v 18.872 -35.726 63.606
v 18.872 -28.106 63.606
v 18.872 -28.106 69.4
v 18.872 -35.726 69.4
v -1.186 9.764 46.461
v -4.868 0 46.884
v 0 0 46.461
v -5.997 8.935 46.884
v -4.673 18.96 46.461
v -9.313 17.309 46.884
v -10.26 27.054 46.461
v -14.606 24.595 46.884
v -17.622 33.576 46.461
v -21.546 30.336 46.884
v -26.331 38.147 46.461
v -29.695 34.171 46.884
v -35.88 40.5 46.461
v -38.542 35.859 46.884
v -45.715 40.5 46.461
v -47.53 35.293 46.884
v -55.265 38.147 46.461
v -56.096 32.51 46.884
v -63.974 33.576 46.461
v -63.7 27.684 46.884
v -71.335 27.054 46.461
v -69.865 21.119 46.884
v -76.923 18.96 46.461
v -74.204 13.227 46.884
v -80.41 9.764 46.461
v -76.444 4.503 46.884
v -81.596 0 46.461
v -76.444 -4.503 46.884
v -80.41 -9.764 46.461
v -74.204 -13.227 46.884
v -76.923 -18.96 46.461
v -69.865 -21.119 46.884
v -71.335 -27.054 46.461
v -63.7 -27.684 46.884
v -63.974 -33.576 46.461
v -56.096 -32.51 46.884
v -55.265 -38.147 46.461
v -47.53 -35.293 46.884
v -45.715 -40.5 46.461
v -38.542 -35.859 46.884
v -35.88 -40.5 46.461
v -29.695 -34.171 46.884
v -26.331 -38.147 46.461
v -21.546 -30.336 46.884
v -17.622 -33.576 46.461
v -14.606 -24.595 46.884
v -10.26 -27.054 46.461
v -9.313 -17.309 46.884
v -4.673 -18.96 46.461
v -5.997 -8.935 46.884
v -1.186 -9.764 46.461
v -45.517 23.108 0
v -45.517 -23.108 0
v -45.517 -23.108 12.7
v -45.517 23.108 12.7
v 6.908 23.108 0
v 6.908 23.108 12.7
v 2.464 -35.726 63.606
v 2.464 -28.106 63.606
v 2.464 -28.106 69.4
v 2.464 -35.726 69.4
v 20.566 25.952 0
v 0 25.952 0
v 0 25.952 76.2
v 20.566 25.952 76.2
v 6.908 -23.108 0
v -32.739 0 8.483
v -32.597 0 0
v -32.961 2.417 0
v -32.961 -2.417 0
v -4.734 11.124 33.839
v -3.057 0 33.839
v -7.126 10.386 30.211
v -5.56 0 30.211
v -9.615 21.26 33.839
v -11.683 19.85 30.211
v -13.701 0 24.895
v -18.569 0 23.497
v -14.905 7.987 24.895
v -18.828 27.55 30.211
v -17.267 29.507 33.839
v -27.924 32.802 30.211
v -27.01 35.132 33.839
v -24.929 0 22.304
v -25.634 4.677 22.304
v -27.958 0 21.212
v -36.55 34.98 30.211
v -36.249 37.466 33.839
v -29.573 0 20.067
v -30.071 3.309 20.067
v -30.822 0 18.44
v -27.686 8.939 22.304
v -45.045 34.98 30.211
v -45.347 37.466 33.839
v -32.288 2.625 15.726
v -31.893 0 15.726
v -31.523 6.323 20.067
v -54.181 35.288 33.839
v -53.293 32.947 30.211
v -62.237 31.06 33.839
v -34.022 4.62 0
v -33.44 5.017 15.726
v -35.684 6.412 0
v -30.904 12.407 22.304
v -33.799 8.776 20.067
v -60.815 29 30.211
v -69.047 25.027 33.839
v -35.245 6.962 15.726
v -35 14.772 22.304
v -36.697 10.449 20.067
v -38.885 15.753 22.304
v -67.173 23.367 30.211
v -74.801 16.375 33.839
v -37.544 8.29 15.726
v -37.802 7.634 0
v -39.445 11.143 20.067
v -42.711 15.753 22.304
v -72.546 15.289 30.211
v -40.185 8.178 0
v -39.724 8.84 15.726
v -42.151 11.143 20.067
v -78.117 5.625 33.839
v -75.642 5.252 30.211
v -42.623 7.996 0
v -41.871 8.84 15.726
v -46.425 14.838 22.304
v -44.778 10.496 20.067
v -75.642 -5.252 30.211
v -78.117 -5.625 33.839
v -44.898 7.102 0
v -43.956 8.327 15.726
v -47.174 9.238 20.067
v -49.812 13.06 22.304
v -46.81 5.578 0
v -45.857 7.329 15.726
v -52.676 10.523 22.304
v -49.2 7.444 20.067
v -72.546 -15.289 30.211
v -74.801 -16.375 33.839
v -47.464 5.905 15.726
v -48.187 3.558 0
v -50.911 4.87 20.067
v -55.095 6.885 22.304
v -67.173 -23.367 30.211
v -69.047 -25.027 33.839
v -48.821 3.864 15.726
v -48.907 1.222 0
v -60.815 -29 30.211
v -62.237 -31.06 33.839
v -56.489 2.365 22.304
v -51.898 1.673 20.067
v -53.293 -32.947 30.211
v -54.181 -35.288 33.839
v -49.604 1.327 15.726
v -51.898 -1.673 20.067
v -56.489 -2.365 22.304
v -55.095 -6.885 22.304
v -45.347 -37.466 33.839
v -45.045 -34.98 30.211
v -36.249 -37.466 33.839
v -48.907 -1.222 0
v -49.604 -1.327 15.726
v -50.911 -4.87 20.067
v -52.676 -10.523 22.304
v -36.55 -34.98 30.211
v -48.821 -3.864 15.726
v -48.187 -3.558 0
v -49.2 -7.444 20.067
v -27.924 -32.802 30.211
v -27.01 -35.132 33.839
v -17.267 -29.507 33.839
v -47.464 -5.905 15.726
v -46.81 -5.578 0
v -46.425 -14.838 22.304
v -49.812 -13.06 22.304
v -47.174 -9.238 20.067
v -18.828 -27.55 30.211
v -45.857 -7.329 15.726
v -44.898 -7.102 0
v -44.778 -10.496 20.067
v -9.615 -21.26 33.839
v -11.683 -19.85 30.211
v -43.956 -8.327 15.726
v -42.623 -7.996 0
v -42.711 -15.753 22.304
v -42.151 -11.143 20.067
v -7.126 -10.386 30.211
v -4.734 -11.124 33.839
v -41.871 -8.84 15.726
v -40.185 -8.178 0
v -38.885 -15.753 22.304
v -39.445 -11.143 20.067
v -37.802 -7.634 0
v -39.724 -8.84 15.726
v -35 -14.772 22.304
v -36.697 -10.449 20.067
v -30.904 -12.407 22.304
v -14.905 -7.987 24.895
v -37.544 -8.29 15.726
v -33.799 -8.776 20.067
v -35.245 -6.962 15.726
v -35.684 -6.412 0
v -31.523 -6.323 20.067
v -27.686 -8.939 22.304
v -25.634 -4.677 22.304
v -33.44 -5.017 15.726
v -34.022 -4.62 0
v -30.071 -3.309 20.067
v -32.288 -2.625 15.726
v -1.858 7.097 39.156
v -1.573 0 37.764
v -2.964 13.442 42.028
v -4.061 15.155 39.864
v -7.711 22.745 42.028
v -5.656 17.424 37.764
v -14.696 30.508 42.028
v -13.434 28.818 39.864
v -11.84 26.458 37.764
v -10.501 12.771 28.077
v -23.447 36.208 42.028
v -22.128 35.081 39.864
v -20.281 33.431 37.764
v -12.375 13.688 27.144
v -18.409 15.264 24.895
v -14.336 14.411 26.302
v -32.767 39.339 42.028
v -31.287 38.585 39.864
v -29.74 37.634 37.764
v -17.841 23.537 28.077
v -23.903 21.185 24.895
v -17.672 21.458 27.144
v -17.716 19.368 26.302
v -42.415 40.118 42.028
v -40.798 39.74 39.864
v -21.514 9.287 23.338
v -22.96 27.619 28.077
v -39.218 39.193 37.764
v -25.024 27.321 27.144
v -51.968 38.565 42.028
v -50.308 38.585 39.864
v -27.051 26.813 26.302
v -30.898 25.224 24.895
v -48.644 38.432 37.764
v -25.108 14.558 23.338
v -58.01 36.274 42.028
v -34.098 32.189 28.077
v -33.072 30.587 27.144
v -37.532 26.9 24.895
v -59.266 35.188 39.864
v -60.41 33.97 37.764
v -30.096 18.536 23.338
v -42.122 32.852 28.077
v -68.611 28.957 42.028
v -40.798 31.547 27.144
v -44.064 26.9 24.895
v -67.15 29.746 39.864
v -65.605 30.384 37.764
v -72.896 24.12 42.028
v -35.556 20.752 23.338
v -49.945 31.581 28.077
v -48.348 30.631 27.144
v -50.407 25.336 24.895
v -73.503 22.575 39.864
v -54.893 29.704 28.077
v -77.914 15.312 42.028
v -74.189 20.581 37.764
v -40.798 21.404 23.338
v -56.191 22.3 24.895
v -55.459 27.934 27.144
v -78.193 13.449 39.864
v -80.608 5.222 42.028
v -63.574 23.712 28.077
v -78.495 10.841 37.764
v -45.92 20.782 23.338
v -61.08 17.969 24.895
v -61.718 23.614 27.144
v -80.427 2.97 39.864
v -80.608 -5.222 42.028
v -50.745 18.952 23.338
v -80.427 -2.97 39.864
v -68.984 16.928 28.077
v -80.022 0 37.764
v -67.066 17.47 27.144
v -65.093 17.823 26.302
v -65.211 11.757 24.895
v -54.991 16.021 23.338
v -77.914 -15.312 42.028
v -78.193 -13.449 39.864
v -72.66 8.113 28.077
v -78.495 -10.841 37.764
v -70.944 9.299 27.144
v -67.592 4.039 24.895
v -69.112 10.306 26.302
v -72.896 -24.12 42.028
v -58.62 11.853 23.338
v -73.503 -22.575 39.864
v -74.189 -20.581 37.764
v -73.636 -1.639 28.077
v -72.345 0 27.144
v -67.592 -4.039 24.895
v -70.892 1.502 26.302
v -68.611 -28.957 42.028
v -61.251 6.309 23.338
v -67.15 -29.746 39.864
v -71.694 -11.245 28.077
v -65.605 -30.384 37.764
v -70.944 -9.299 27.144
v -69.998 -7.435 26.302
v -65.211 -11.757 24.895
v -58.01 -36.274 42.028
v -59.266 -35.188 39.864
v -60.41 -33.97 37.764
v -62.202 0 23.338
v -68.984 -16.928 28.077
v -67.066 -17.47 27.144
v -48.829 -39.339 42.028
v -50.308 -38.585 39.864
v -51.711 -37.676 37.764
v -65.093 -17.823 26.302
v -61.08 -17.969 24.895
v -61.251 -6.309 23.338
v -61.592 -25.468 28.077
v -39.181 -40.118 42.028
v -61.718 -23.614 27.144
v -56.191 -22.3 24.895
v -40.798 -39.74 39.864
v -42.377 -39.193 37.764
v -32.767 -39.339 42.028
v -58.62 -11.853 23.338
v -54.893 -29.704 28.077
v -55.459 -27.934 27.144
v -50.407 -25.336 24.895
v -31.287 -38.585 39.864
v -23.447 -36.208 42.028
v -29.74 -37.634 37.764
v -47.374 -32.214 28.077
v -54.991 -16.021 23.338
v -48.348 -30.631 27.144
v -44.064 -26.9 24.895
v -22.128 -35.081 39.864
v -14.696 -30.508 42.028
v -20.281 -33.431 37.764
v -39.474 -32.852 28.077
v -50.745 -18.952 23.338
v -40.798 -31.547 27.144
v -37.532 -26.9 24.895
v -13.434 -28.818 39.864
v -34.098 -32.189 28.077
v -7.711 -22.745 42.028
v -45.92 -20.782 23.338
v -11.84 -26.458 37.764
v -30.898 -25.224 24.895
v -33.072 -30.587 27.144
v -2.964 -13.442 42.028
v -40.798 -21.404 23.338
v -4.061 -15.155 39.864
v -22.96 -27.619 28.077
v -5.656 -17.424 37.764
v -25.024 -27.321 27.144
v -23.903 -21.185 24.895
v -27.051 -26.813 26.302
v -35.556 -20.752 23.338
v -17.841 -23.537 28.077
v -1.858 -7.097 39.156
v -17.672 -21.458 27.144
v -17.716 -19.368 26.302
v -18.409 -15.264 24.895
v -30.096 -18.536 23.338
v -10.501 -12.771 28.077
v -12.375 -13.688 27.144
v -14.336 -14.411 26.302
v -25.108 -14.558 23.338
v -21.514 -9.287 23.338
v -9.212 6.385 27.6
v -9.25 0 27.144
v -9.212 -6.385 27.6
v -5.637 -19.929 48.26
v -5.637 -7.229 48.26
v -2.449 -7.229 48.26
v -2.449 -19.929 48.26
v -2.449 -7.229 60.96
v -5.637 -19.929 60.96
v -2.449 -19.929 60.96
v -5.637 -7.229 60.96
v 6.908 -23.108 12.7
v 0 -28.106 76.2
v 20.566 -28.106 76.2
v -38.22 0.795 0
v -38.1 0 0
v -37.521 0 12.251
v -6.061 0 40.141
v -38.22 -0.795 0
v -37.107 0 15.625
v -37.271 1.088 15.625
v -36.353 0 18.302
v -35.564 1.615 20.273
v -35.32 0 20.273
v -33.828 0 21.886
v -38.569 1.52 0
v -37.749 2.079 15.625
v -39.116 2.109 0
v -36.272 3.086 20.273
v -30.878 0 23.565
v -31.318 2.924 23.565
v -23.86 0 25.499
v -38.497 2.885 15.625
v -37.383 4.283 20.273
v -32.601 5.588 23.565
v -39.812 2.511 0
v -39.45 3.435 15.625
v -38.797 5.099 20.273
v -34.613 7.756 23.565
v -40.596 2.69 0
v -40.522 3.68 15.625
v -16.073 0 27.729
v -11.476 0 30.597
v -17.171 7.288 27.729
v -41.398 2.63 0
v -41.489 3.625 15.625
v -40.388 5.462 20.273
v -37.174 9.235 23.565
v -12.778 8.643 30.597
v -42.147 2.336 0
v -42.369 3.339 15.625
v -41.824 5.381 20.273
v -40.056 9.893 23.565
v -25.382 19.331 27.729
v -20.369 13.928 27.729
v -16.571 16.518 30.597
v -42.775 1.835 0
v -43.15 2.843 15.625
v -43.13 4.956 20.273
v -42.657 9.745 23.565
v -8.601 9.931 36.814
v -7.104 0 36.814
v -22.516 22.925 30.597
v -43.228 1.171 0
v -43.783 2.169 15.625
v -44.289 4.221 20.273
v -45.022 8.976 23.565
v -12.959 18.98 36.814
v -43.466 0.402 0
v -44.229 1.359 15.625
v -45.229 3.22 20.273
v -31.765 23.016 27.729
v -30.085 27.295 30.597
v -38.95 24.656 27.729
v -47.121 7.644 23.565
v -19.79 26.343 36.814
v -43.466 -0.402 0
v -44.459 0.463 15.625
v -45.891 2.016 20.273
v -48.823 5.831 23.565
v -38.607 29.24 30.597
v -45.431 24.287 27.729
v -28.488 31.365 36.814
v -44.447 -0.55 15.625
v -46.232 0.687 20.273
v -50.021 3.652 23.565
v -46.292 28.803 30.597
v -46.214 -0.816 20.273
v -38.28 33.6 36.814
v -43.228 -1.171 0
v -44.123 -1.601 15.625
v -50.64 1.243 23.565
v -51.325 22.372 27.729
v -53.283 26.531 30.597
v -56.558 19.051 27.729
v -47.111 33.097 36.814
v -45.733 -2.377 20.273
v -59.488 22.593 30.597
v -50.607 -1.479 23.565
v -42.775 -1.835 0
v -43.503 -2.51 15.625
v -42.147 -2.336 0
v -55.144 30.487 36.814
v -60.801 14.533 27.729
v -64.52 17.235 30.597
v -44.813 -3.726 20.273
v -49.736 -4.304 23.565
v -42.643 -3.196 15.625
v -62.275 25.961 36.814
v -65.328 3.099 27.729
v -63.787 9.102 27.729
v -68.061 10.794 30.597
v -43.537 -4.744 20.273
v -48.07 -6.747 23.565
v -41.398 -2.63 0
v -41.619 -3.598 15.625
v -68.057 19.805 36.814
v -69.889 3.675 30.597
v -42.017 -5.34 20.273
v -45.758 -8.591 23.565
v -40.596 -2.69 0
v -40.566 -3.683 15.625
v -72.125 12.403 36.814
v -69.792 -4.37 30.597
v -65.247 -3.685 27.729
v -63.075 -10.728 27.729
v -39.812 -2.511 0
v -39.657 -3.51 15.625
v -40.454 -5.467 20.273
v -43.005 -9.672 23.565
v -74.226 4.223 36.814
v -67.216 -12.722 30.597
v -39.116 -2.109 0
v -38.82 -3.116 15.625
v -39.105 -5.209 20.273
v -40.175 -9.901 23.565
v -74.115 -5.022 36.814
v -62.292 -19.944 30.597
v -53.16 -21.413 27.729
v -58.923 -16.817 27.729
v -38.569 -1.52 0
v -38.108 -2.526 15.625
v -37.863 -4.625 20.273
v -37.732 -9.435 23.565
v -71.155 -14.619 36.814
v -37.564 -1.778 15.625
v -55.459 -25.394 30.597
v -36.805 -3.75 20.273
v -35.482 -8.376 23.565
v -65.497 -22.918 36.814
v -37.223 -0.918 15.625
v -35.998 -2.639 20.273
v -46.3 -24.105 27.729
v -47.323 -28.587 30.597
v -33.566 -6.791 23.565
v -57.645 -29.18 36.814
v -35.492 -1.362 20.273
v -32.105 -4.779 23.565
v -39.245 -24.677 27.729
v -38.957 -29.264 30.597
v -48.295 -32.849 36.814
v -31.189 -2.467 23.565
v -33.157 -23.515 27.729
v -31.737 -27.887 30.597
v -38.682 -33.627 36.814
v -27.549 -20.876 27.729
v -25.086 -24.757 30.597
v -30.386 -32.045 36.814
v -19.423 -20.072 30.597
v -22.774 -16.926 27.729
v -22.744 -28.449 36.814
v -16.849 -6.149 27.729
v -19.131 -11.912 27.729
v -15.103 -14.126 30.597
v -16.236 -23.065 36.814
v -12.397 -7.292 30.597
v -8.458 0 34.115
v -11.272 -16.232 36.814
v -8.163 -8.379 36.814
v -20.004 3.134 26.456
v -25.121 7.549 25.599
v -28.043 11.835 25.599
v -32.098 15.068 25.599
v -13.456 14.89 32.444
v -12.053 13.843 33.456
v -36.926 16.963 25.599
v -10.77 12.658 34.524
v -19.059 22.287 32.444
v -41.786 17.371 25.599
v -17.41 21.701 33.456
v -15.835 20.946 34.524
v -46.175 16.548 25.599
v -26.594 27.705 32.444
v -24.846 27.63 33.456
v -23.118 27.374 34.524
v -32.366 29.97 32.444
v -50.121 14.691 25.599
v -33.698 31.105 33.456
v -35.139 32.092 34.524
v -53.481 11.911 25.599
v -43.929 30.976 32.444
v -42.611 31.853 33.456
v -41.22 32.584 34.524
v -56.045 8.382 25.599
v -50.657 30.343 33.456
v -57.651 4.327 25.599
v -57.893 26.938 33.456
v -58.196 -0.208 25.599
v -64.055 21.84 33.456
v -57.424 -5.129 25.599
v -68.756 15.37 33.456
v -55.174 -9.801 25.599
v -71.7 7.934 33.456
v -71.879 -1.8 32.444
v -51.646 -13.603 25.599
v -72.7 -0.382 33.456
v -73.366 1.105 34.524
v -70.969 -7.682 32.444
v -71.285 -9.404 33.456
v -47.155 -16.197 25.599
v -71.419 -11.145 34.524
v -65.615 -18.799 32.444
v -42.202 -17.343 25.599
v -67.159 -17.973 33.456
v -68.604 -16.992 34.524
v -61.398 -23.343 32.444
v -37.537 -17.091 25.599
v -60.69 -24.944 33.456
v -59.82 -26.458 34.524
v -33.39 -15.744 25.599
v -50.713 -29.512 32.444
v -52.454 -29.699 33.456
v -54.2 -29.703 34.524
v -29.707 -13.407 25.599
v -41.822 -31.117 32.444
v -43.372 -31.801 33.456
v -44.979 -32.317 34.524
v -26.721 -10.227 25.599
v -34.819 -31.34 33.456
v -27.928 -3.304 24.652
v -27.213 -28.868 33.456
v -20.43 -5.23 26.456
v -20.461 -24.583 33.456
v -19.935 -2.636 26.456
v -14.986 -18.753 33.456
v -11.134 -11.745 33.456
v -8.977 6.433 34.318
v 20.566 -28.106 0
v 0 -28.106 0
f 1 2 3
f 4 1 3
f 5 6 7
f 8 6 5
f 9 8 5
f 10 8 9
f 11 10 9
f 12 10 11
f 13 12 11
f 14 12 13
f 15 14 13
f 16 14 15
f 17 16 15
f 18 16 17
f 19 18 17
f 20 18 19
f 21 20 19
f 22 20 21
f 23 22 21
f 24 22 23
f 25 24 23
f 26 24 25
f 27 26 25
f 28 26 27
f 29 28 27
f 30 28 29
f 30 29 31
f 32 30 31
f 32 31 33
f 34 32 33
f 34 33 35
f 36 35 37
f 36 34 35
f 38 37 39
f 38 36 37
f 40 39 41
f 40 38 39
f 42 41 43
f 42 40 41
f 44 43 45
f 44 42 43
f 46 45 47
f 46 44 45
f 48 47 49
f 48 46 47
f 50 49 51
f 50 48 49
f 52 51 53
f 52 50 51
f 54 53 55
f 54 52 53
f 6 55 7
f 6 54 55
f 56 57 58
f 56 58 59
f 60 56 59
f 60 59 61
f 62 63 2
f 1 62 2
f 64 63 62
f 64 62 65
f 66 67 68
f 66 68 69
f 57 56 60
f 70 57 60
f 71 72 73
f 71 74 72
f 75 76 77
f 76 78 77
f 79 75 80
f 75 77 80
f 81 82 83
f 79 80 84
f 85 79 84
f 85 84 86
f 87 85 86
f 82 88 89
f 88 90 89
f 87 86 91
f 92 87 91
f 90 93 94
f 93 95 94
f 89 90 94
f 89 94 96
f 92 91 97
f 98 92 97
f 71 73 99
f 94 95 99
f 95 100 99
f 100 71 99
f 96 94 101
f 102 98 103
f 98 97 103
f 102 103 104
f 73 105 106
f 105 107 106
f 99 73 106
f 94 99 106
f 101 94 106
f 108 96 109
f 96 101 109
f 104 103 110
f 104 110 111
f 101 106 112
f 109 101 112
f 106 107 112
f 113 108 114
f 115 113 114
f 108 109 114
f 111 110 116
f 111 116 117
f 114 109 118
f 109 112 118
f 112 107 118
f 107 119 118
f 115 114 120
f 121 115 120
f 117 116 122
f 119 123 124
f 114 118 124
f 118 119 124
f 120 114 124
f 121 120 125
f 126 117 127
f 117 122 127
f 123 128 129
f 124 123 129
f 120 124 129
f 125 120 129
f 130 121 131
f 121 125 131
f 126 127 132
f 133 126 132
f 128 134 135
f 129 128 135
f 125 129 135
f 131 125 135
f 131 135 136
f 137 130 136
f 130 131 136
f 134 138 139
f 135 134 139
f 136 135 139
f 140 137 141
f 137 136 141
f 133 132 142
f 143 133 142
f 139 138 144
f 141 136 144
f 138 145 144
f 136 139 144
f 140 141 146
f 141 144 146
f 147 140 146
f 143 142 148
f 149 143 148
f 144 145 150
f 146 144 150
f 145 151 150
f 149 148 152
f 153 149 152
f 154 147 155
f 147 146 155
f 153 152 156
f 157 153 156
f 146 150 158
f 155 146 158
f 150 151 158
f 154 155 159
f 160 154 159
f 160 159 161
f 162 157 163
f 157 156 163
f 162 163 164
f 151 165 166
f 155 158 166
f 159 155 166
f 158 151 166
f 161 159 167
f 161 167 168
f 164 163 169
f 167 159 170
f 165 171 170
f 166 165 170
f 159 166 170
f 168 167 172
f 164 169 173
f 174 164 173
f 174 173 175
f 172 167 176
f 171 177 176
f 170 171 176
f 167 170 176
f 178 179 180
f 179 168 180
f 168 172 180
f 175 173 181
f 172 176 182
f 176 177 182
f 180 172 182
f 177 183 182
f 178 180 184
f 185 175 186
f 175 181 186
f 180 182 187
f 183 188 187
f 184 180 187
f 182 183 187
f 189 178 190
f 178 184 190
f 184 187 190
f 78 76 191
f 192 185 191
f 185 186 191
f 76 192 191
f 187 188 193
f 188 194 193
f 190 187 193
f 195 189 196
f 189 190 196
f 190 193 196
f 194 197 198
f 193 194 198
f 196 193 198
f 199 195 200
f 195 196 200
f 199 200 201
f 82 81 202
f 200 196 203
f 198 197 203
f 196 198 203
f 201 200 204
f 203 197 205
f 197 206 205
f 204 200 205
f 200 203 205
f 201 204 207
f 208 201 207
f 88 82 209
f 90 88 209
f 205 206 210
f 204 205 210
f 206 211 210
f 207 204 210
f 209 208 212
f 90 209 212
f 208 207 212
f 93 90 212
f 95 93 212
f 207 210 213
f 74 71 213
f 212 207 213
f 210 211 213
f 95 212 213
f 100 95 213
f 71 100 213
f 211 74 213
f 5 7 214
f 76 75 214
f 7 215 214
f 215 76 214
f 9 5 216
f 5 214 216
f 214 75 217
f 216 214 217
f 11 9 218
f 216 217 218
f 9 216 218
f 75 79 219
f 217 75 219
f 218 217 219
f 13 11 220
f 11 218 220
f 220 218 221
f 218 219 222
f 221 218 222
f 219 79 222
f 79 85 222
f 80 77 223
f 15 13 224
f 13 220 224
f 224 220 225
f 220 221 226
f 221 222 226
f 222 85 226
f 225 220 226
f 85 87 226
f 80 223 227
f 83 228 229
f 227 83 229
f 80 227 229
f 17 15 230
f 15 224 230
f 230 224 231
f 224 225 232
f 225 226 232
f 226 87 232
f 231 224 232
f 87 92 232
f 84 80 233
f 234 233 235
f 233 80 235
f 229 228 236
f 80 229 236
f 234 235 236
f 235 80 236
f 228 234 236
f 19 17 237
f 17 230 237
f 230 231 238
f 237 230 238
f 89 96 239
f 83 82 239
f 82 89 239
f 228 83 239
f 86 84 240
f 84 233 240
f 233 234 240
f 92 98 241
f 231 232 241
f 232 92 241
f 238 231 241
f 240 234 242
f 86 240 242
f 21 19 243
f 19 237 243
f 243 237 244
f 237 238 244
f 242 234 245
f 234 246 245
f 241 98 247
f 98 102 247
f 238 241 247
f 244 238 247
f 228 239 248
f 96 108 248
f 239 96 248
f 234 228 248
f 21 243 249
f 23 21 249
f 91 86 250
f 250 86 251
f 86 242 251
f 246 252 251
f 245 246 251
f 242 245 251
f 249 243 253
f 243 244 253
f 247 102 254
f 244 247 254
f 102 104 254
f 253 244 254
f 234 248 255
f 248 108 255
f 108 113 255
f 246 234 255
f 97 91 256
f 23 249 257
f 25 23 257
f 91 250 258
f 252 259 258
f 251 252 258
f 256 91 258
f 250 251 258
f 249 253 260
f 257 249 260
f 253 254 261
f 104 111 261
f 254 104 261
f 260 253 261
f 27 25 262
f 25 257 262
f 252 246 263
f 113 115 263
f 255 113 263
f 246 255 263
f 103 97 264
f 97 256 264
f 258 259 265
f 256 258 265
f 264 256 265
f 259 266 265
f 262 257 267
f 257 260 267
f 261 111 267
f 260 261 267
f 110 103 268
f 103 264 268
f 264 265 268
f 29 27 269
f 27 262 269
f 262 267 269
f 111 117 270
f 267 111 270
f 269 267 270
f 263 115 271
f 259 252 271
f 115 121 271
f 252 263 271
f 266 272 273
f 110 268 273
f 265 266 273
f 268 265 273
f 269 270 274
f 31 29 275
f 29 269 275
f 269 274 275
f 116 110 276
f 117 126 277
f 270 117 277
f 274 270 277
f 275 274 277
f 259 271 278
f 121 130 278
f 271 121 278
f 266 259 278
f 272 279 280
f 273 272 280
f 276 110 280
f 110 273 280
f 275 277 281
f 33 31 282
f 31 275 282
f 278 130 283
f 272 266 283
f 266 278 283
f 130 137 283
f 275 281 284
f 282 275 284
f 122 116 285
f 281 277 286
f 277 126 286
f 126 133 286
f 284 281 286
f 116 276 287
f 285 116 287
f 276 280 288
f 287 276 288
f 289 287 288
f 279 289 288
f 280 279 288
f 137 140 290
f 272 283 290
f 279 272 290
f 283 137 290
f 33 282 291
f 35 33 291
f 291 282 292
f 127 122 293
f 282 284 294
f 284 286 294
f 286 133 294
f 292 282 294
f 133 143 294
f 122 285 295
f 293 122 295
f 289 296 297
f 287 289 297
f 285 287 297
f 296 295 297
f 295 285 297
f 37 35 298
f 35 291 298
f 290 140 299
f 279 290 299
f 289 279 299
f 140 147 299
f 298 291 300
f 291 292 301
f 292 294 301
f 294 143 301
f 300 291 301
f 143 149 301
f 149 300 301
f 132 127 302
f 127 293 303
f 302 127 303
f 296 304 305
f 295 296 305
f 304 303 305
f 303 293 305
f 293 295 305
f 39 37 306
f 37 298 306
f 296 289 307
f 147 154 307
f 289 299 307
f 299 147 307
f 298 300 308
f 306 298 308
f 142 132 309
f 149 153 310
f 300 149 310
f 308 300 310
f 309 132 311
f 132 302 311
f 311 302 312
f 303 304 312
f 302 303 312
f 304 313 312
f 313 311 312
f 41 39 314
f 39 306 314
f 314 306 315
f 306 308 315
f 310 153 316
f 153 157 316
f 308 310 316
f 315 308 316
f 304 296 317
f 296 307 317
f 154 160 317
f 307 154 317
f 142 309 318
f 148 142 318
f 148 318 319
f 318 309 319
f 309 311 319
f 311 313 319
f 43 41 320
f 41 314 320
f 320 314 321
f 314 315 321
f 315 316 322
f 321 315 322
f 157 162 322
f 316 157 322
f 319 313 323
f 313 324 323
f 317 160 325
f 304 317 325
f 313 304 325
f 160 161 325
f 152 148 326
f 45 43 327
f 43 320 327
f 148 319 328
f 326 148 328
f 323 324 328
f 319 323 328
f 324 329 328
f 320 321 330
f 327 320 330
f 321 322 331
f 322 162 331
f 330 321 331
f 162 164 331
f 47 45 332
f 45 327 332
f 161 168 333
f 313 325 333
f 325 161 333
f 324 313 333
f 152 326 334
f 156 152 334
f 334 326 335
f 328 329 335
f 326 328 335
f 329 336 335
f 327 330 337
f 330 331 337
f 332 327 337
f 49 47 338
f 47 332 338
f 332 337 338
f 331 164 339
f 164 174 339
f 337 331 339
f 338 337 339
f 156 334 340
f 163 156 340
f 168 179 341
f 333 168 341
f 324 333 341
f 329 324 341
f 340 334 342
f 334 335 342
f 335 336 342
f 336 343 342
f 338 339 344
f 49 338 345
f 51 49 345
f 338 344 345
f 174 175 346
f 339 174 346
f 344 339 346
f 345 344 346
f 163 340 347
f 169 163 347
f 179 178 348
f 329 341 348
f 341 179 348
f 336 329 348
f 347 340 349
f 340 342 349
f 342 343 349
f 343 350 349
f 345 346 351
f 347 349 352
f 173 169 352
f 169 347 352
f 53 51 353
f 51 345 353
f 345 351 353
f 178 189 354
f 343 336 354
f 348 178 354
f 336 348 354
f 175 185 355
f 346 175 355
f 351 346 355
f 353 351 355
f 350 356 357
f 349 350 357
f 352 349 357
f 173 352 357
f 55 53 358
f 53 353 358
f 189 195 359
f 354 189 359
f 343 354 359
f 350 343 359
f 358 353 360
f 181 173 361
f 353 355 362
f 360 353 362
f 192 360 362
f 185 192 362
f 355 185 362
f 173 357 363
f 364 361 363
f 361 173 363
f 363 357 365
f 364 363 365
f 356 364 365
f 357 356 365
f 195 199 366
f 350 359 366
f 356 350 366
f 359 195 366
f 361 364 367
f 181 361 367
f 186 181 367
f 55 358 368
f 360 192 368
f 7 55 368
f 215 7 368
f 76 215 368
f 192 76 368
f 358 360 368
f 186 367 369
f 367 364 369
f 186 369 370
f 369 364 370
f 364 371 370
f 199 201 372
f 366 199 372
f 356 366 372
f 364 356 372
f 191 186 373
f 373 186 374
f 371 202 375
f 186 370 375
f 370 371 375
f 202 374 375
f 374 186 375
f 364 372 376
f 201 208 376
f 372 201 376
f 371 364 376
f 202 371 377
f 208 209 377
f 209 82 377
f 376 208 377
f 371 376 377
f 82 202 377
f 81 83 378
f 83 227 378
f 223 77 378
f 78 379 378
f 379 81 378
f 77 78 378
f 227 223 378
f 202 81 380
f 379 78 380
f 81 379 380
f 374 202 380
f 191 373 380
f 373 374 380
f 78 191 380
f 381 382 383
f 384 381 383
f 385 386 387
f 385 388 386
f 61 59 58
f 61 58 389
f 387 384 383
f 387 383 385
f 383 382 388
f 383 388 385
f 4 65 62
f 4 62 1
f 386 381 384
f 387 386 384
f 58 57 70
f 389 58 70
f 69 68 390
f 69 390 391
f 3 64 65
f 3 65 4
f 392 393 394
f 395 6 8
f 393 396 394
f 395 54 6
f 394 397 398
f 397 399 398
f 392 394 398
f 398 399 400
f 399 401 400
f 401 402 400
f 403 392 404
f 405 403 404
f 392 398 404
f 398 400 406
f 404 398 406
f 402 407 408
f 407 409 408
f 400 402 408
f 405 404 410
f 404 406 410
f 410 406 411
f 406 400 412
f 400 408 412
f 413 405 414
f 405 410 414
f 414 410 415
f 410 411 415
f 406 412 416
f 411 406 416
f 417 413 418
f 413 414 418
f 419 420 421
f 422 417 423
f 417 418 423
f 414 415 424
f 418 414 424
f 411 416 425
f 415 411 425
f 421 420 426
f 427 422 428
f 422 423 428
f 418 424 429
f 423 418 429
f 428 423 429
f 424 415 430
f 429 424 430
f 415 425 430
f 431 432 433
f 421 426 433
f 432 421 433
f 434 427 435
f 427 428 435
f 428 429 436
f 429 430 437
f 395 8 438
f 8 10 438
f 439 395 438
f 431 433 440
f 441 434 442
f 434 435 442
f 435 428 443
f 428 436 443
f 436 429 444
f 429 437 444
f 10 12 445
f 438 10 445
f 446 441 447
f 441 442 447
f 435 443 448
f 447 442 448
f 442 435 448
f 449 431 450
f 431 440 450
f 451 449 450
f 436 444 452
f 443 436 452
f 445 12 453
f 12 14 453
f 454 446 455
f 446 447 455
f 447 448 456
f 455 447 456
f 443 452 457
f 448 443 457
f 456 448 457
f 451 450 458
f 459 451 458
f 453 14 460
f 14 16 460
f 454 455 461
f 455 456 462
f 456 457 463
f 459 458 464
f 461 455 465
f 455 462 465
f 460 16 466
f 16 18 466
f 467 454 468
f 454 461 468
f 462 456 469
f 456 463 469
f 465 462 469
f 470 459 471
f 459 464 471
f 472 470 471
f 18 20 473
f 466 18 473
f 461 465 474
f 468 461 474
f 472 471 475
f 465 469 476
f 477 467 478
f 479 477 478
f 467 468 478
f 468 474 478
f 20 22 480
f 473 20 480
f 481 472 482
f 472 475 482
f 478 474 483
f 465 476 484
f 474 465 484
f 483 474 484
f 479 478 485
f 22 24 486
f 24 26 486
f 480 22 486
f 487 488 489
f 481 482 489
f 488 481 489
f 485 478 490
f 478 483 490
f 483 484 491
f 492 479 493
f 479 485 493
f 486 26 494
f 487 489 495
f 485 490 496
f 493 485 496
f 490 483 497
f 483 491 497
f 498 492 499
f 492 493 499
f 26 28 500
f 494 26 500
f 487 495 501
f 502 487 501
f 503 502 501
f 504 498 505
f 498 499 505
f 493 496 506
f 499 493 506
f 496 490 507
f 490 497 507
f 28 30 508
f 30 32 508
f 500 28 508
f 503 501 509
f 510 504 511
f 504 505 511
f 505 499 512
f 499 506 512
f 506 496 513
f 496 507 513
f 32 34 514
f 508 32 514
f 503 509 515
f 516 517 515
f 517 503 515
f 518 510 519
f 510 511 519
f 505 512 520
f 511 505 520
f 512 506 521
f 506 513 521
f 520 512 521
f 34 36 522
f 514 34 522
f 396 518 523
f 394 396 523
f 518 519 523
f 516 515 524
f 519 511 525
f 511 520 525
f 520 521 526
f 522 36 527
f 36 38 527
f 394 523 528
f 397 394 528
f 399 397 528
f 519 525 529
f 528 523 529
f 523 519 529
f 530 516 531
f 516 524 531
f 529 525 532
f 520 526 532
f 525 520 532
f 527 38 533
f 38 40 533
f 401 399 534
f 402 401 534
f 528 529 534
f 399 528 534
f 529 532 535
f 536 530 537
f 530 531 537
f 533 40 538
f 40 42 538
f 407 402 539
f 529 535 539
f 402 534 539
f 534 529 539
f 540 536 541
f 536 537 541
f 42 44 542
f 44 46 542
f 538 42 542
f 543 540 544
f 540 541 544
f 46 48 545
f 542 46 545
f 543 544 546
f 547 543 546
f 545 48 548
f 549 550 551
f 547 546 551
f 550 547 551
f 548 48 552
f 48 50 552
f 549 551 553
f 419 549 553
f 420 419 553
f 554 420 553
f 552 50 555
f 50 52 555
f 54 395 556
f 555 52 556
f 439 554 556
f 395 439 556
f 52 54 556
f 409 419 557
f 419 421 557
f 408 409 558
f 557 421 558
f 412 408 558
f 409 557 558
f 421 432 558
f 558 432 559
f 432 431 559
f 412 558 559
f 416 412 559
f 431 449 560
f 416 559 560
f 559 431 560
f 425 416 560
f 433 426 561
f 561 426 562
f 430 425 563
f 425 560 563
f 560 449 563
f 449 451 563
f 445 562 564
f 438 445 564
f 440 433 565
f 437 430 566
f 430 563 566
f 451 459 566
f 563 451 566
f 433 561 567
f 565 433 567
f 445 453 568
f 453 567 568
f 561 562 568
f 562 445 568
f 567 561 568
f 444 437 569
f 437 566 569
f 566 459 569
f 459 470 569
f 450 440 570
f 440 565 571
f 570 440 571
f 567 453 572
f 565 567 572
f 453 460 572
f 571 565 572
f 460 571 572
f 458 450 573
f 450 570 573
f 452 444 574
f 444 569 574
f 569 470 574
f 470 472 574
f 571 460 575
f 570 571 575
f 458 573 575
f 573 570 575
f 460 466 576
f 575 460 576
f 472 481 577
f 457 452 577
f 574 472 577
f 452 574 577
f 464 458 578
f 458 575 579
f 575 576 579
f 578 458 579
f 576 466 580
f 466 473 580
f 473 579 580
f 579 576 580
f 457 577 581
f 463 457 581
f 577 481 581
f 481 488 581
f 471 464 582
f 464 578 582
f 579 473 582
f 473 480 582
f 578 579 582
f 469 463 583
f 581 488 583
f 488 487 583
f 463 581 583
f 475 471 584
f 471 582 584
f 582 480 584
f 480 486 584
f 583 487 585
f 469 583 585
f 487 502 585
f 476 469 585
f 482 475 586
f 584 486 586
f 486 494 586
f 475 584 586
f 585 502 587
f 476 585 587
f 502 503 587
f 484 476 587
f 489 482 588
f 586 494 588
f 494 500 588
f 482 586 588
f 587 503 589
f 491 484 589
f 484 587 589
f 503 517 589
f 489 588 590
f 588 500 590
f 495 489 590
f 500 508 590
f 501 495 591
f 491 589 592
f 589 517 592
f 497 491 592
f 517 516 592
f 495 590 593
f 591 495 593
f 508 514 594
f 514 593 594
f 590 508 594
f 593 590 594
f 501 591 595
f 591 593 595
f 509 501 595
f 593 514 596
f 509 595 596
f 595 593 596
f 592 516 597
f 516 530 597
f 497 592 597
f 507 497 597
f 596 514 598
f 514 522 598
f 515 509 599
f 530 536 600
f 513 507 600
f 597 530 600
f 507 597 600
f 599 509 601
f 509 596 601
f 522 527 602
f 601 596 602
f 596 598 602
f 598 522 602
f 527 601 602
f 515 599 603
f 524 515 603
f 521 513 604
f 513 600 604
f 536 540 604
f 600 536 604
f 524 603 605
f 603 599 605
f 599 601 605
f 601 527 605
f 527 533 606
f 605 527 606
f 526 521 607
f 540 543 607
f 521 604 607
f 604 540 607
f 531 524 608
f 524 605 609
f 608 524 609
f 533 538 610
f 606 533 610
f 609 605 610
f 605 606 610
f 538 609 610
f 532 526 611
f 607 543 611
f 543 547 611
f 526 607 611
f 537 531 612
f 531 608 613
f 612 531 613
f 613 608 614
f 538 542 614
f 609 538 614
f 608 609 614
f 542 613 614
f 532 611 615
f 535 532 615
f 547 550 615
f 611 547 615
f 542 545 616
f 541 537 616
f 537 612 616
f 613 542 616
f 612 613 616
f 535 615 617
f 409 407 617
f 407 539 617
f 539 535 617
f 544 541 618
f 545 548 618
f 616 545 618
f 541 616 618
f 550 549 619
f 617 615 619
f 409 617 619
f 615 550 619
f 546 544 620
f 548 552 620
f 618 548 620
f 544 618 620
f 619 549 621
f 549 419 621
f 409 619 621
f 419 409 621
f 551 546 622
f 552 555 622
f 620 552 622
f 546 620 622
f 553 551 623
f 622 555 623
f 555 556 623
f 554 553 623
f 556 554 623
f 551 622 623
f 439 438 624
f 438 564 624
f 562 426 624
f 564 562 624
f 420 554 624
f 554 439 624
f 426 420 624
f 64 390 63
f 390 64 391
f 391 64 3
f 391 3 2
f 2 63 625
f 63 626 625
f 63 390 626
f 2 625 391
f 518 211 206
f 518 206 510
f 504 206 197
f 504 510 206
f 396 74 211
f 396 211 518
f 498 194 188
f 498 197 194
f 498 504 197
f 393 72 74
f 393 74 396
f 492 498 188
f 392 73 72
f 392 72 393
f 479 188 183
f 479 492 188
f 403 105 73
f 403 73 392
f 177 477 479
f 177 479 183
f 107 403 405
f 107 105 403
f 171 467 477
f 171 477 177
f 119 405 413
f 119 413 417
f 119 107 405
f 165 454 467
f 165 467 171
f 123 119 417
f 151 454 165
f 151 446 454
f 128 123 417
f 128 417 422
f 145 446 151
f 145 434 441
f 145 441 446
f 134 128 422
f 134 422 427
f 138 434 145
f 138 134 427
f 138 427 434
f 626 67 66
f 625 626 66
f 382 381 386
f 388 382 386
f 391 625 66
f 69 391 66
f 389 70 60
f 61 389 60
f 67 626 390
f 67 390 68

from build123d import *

# Parameters (mm, degrees)
F0_W      = 20.5656066537
F0_H      = 54.0581624955
F1_DEPTH  = 76.2
F5_W      = 16.4082637057
F5_H      = 5.7945027947
F6_DEPTH  = 7.62
F7_W      = 52.424851805
F7_H      = 46.2164059281
F8_DEPTH  = 12.7
F10_W     = 3.1882505864
F10_H     = 10.9414318576
F11_DEPTH = 12.7
F12_DEPTH = 25.4
F13_DEPTH = 12.7


with BuildPart() as f1:
    # F0 (on Top) → F1 (new body)
    with BuildSketch(Plane.XY):
        with Locations((10.2828033268, -1.0772468522)):
            Rectangle(F0_W, F0_H)
    extrude(amount=F1_DEPTH)

    # F5 (on face) → F6 (join)
    with BuildSketch(Plane.XZ.offset(28.1063281)):
        with Locations((10.6682186015, 66.5030814707)):
            Rectangle(F5_W, F5_H)
    extrude(amount=F6_DEPTH)


with BuildPart() as f4:
    # F2 (on Front) → F4 (revolve)
    with BuildSketch(Plane.XZ):
        with BuildLine():
            add(Edge.make_bspline(
                [(0, 46.4608344404), (-0.712629488, 41.1682067449), (-2.1380265, 30.5819261738), (-16.5368148643, 22.5173794107), (-33.4028787088, 22.8297413406), (-32.8829115311, 8.1056571837), (-32.5966678744, 0)],
                knots=[0, 0, 0, 0, 0.244948915, 0.4899452765, 0.7192131823, 1, 1, 1, 1], degree=3))
            Line((0, 46.4608344404), (-4.8683337359, 46.8841713971))
            add(Edge.make_bspline(
                [(-38.1, 0), (-37.9331579189, 2.4214950026), (-37.5517035553, 7.9578071182), (-37.5878736416, 24.6213915584), (-17.1486198813, 25.3630469839), (-6.7295544595, 34.0025257621), (-5.4872138126, 42.6008568298), (-4.8683337359, 46.8841713971)],
                knots=[0, 0, 0, 0, 0.1604712998, 0.3668887198, 0.6016946245, 0.8015815856, 1, 1, 1, 1], degree=3))
            Line((-38.1, 0), (-32.5966678744, 0))
        make_face()
    revolve(axis=Axis((-40.797829628, 0, 25.5370792001), (0, 0, 1)))


with BuildPart() as f8:
    # F7 (on Top) → F8 (new body)
    with BuildSketch(Plane.XY):
        with Locations((-19.3041469902, 0)):
            Rectangle(F7_W, F7_H)
    extrude(amount=F8_DEPTH)


with BuildPart() as f11:
    # F10 (on offset) → F11 (new body)
    with BuildSketch(Plane.XY.offset(48.26)):
        with Locations((-4.0426328778, 0)):
            Rectangle(F10_W, F10_H)
    extrude(amount=F11_DEPTH)

    # F12 (add): a face of the model
    f12_faces = [f11.faces().sort_by_distance(p)[0] for p in [
        (-4.0426328778, 5.4707159288, 54.61),
    ]]
    extrude(f12_faces, amount=-F12_DEPTH)

    # F13 (cut): a face of the model
    f13_faces = [f11.faces().sort_by_distance(p)[0] for p in [
        (-4.0426328778, 5.4707159288, 54.61),
    ]]
    extrude(f13_faces, amount=-F13_DEPTH, mode=Mode.SUBTRACT)


solid = Compound([f1.part, f4.part, f8.part, f11.part])
